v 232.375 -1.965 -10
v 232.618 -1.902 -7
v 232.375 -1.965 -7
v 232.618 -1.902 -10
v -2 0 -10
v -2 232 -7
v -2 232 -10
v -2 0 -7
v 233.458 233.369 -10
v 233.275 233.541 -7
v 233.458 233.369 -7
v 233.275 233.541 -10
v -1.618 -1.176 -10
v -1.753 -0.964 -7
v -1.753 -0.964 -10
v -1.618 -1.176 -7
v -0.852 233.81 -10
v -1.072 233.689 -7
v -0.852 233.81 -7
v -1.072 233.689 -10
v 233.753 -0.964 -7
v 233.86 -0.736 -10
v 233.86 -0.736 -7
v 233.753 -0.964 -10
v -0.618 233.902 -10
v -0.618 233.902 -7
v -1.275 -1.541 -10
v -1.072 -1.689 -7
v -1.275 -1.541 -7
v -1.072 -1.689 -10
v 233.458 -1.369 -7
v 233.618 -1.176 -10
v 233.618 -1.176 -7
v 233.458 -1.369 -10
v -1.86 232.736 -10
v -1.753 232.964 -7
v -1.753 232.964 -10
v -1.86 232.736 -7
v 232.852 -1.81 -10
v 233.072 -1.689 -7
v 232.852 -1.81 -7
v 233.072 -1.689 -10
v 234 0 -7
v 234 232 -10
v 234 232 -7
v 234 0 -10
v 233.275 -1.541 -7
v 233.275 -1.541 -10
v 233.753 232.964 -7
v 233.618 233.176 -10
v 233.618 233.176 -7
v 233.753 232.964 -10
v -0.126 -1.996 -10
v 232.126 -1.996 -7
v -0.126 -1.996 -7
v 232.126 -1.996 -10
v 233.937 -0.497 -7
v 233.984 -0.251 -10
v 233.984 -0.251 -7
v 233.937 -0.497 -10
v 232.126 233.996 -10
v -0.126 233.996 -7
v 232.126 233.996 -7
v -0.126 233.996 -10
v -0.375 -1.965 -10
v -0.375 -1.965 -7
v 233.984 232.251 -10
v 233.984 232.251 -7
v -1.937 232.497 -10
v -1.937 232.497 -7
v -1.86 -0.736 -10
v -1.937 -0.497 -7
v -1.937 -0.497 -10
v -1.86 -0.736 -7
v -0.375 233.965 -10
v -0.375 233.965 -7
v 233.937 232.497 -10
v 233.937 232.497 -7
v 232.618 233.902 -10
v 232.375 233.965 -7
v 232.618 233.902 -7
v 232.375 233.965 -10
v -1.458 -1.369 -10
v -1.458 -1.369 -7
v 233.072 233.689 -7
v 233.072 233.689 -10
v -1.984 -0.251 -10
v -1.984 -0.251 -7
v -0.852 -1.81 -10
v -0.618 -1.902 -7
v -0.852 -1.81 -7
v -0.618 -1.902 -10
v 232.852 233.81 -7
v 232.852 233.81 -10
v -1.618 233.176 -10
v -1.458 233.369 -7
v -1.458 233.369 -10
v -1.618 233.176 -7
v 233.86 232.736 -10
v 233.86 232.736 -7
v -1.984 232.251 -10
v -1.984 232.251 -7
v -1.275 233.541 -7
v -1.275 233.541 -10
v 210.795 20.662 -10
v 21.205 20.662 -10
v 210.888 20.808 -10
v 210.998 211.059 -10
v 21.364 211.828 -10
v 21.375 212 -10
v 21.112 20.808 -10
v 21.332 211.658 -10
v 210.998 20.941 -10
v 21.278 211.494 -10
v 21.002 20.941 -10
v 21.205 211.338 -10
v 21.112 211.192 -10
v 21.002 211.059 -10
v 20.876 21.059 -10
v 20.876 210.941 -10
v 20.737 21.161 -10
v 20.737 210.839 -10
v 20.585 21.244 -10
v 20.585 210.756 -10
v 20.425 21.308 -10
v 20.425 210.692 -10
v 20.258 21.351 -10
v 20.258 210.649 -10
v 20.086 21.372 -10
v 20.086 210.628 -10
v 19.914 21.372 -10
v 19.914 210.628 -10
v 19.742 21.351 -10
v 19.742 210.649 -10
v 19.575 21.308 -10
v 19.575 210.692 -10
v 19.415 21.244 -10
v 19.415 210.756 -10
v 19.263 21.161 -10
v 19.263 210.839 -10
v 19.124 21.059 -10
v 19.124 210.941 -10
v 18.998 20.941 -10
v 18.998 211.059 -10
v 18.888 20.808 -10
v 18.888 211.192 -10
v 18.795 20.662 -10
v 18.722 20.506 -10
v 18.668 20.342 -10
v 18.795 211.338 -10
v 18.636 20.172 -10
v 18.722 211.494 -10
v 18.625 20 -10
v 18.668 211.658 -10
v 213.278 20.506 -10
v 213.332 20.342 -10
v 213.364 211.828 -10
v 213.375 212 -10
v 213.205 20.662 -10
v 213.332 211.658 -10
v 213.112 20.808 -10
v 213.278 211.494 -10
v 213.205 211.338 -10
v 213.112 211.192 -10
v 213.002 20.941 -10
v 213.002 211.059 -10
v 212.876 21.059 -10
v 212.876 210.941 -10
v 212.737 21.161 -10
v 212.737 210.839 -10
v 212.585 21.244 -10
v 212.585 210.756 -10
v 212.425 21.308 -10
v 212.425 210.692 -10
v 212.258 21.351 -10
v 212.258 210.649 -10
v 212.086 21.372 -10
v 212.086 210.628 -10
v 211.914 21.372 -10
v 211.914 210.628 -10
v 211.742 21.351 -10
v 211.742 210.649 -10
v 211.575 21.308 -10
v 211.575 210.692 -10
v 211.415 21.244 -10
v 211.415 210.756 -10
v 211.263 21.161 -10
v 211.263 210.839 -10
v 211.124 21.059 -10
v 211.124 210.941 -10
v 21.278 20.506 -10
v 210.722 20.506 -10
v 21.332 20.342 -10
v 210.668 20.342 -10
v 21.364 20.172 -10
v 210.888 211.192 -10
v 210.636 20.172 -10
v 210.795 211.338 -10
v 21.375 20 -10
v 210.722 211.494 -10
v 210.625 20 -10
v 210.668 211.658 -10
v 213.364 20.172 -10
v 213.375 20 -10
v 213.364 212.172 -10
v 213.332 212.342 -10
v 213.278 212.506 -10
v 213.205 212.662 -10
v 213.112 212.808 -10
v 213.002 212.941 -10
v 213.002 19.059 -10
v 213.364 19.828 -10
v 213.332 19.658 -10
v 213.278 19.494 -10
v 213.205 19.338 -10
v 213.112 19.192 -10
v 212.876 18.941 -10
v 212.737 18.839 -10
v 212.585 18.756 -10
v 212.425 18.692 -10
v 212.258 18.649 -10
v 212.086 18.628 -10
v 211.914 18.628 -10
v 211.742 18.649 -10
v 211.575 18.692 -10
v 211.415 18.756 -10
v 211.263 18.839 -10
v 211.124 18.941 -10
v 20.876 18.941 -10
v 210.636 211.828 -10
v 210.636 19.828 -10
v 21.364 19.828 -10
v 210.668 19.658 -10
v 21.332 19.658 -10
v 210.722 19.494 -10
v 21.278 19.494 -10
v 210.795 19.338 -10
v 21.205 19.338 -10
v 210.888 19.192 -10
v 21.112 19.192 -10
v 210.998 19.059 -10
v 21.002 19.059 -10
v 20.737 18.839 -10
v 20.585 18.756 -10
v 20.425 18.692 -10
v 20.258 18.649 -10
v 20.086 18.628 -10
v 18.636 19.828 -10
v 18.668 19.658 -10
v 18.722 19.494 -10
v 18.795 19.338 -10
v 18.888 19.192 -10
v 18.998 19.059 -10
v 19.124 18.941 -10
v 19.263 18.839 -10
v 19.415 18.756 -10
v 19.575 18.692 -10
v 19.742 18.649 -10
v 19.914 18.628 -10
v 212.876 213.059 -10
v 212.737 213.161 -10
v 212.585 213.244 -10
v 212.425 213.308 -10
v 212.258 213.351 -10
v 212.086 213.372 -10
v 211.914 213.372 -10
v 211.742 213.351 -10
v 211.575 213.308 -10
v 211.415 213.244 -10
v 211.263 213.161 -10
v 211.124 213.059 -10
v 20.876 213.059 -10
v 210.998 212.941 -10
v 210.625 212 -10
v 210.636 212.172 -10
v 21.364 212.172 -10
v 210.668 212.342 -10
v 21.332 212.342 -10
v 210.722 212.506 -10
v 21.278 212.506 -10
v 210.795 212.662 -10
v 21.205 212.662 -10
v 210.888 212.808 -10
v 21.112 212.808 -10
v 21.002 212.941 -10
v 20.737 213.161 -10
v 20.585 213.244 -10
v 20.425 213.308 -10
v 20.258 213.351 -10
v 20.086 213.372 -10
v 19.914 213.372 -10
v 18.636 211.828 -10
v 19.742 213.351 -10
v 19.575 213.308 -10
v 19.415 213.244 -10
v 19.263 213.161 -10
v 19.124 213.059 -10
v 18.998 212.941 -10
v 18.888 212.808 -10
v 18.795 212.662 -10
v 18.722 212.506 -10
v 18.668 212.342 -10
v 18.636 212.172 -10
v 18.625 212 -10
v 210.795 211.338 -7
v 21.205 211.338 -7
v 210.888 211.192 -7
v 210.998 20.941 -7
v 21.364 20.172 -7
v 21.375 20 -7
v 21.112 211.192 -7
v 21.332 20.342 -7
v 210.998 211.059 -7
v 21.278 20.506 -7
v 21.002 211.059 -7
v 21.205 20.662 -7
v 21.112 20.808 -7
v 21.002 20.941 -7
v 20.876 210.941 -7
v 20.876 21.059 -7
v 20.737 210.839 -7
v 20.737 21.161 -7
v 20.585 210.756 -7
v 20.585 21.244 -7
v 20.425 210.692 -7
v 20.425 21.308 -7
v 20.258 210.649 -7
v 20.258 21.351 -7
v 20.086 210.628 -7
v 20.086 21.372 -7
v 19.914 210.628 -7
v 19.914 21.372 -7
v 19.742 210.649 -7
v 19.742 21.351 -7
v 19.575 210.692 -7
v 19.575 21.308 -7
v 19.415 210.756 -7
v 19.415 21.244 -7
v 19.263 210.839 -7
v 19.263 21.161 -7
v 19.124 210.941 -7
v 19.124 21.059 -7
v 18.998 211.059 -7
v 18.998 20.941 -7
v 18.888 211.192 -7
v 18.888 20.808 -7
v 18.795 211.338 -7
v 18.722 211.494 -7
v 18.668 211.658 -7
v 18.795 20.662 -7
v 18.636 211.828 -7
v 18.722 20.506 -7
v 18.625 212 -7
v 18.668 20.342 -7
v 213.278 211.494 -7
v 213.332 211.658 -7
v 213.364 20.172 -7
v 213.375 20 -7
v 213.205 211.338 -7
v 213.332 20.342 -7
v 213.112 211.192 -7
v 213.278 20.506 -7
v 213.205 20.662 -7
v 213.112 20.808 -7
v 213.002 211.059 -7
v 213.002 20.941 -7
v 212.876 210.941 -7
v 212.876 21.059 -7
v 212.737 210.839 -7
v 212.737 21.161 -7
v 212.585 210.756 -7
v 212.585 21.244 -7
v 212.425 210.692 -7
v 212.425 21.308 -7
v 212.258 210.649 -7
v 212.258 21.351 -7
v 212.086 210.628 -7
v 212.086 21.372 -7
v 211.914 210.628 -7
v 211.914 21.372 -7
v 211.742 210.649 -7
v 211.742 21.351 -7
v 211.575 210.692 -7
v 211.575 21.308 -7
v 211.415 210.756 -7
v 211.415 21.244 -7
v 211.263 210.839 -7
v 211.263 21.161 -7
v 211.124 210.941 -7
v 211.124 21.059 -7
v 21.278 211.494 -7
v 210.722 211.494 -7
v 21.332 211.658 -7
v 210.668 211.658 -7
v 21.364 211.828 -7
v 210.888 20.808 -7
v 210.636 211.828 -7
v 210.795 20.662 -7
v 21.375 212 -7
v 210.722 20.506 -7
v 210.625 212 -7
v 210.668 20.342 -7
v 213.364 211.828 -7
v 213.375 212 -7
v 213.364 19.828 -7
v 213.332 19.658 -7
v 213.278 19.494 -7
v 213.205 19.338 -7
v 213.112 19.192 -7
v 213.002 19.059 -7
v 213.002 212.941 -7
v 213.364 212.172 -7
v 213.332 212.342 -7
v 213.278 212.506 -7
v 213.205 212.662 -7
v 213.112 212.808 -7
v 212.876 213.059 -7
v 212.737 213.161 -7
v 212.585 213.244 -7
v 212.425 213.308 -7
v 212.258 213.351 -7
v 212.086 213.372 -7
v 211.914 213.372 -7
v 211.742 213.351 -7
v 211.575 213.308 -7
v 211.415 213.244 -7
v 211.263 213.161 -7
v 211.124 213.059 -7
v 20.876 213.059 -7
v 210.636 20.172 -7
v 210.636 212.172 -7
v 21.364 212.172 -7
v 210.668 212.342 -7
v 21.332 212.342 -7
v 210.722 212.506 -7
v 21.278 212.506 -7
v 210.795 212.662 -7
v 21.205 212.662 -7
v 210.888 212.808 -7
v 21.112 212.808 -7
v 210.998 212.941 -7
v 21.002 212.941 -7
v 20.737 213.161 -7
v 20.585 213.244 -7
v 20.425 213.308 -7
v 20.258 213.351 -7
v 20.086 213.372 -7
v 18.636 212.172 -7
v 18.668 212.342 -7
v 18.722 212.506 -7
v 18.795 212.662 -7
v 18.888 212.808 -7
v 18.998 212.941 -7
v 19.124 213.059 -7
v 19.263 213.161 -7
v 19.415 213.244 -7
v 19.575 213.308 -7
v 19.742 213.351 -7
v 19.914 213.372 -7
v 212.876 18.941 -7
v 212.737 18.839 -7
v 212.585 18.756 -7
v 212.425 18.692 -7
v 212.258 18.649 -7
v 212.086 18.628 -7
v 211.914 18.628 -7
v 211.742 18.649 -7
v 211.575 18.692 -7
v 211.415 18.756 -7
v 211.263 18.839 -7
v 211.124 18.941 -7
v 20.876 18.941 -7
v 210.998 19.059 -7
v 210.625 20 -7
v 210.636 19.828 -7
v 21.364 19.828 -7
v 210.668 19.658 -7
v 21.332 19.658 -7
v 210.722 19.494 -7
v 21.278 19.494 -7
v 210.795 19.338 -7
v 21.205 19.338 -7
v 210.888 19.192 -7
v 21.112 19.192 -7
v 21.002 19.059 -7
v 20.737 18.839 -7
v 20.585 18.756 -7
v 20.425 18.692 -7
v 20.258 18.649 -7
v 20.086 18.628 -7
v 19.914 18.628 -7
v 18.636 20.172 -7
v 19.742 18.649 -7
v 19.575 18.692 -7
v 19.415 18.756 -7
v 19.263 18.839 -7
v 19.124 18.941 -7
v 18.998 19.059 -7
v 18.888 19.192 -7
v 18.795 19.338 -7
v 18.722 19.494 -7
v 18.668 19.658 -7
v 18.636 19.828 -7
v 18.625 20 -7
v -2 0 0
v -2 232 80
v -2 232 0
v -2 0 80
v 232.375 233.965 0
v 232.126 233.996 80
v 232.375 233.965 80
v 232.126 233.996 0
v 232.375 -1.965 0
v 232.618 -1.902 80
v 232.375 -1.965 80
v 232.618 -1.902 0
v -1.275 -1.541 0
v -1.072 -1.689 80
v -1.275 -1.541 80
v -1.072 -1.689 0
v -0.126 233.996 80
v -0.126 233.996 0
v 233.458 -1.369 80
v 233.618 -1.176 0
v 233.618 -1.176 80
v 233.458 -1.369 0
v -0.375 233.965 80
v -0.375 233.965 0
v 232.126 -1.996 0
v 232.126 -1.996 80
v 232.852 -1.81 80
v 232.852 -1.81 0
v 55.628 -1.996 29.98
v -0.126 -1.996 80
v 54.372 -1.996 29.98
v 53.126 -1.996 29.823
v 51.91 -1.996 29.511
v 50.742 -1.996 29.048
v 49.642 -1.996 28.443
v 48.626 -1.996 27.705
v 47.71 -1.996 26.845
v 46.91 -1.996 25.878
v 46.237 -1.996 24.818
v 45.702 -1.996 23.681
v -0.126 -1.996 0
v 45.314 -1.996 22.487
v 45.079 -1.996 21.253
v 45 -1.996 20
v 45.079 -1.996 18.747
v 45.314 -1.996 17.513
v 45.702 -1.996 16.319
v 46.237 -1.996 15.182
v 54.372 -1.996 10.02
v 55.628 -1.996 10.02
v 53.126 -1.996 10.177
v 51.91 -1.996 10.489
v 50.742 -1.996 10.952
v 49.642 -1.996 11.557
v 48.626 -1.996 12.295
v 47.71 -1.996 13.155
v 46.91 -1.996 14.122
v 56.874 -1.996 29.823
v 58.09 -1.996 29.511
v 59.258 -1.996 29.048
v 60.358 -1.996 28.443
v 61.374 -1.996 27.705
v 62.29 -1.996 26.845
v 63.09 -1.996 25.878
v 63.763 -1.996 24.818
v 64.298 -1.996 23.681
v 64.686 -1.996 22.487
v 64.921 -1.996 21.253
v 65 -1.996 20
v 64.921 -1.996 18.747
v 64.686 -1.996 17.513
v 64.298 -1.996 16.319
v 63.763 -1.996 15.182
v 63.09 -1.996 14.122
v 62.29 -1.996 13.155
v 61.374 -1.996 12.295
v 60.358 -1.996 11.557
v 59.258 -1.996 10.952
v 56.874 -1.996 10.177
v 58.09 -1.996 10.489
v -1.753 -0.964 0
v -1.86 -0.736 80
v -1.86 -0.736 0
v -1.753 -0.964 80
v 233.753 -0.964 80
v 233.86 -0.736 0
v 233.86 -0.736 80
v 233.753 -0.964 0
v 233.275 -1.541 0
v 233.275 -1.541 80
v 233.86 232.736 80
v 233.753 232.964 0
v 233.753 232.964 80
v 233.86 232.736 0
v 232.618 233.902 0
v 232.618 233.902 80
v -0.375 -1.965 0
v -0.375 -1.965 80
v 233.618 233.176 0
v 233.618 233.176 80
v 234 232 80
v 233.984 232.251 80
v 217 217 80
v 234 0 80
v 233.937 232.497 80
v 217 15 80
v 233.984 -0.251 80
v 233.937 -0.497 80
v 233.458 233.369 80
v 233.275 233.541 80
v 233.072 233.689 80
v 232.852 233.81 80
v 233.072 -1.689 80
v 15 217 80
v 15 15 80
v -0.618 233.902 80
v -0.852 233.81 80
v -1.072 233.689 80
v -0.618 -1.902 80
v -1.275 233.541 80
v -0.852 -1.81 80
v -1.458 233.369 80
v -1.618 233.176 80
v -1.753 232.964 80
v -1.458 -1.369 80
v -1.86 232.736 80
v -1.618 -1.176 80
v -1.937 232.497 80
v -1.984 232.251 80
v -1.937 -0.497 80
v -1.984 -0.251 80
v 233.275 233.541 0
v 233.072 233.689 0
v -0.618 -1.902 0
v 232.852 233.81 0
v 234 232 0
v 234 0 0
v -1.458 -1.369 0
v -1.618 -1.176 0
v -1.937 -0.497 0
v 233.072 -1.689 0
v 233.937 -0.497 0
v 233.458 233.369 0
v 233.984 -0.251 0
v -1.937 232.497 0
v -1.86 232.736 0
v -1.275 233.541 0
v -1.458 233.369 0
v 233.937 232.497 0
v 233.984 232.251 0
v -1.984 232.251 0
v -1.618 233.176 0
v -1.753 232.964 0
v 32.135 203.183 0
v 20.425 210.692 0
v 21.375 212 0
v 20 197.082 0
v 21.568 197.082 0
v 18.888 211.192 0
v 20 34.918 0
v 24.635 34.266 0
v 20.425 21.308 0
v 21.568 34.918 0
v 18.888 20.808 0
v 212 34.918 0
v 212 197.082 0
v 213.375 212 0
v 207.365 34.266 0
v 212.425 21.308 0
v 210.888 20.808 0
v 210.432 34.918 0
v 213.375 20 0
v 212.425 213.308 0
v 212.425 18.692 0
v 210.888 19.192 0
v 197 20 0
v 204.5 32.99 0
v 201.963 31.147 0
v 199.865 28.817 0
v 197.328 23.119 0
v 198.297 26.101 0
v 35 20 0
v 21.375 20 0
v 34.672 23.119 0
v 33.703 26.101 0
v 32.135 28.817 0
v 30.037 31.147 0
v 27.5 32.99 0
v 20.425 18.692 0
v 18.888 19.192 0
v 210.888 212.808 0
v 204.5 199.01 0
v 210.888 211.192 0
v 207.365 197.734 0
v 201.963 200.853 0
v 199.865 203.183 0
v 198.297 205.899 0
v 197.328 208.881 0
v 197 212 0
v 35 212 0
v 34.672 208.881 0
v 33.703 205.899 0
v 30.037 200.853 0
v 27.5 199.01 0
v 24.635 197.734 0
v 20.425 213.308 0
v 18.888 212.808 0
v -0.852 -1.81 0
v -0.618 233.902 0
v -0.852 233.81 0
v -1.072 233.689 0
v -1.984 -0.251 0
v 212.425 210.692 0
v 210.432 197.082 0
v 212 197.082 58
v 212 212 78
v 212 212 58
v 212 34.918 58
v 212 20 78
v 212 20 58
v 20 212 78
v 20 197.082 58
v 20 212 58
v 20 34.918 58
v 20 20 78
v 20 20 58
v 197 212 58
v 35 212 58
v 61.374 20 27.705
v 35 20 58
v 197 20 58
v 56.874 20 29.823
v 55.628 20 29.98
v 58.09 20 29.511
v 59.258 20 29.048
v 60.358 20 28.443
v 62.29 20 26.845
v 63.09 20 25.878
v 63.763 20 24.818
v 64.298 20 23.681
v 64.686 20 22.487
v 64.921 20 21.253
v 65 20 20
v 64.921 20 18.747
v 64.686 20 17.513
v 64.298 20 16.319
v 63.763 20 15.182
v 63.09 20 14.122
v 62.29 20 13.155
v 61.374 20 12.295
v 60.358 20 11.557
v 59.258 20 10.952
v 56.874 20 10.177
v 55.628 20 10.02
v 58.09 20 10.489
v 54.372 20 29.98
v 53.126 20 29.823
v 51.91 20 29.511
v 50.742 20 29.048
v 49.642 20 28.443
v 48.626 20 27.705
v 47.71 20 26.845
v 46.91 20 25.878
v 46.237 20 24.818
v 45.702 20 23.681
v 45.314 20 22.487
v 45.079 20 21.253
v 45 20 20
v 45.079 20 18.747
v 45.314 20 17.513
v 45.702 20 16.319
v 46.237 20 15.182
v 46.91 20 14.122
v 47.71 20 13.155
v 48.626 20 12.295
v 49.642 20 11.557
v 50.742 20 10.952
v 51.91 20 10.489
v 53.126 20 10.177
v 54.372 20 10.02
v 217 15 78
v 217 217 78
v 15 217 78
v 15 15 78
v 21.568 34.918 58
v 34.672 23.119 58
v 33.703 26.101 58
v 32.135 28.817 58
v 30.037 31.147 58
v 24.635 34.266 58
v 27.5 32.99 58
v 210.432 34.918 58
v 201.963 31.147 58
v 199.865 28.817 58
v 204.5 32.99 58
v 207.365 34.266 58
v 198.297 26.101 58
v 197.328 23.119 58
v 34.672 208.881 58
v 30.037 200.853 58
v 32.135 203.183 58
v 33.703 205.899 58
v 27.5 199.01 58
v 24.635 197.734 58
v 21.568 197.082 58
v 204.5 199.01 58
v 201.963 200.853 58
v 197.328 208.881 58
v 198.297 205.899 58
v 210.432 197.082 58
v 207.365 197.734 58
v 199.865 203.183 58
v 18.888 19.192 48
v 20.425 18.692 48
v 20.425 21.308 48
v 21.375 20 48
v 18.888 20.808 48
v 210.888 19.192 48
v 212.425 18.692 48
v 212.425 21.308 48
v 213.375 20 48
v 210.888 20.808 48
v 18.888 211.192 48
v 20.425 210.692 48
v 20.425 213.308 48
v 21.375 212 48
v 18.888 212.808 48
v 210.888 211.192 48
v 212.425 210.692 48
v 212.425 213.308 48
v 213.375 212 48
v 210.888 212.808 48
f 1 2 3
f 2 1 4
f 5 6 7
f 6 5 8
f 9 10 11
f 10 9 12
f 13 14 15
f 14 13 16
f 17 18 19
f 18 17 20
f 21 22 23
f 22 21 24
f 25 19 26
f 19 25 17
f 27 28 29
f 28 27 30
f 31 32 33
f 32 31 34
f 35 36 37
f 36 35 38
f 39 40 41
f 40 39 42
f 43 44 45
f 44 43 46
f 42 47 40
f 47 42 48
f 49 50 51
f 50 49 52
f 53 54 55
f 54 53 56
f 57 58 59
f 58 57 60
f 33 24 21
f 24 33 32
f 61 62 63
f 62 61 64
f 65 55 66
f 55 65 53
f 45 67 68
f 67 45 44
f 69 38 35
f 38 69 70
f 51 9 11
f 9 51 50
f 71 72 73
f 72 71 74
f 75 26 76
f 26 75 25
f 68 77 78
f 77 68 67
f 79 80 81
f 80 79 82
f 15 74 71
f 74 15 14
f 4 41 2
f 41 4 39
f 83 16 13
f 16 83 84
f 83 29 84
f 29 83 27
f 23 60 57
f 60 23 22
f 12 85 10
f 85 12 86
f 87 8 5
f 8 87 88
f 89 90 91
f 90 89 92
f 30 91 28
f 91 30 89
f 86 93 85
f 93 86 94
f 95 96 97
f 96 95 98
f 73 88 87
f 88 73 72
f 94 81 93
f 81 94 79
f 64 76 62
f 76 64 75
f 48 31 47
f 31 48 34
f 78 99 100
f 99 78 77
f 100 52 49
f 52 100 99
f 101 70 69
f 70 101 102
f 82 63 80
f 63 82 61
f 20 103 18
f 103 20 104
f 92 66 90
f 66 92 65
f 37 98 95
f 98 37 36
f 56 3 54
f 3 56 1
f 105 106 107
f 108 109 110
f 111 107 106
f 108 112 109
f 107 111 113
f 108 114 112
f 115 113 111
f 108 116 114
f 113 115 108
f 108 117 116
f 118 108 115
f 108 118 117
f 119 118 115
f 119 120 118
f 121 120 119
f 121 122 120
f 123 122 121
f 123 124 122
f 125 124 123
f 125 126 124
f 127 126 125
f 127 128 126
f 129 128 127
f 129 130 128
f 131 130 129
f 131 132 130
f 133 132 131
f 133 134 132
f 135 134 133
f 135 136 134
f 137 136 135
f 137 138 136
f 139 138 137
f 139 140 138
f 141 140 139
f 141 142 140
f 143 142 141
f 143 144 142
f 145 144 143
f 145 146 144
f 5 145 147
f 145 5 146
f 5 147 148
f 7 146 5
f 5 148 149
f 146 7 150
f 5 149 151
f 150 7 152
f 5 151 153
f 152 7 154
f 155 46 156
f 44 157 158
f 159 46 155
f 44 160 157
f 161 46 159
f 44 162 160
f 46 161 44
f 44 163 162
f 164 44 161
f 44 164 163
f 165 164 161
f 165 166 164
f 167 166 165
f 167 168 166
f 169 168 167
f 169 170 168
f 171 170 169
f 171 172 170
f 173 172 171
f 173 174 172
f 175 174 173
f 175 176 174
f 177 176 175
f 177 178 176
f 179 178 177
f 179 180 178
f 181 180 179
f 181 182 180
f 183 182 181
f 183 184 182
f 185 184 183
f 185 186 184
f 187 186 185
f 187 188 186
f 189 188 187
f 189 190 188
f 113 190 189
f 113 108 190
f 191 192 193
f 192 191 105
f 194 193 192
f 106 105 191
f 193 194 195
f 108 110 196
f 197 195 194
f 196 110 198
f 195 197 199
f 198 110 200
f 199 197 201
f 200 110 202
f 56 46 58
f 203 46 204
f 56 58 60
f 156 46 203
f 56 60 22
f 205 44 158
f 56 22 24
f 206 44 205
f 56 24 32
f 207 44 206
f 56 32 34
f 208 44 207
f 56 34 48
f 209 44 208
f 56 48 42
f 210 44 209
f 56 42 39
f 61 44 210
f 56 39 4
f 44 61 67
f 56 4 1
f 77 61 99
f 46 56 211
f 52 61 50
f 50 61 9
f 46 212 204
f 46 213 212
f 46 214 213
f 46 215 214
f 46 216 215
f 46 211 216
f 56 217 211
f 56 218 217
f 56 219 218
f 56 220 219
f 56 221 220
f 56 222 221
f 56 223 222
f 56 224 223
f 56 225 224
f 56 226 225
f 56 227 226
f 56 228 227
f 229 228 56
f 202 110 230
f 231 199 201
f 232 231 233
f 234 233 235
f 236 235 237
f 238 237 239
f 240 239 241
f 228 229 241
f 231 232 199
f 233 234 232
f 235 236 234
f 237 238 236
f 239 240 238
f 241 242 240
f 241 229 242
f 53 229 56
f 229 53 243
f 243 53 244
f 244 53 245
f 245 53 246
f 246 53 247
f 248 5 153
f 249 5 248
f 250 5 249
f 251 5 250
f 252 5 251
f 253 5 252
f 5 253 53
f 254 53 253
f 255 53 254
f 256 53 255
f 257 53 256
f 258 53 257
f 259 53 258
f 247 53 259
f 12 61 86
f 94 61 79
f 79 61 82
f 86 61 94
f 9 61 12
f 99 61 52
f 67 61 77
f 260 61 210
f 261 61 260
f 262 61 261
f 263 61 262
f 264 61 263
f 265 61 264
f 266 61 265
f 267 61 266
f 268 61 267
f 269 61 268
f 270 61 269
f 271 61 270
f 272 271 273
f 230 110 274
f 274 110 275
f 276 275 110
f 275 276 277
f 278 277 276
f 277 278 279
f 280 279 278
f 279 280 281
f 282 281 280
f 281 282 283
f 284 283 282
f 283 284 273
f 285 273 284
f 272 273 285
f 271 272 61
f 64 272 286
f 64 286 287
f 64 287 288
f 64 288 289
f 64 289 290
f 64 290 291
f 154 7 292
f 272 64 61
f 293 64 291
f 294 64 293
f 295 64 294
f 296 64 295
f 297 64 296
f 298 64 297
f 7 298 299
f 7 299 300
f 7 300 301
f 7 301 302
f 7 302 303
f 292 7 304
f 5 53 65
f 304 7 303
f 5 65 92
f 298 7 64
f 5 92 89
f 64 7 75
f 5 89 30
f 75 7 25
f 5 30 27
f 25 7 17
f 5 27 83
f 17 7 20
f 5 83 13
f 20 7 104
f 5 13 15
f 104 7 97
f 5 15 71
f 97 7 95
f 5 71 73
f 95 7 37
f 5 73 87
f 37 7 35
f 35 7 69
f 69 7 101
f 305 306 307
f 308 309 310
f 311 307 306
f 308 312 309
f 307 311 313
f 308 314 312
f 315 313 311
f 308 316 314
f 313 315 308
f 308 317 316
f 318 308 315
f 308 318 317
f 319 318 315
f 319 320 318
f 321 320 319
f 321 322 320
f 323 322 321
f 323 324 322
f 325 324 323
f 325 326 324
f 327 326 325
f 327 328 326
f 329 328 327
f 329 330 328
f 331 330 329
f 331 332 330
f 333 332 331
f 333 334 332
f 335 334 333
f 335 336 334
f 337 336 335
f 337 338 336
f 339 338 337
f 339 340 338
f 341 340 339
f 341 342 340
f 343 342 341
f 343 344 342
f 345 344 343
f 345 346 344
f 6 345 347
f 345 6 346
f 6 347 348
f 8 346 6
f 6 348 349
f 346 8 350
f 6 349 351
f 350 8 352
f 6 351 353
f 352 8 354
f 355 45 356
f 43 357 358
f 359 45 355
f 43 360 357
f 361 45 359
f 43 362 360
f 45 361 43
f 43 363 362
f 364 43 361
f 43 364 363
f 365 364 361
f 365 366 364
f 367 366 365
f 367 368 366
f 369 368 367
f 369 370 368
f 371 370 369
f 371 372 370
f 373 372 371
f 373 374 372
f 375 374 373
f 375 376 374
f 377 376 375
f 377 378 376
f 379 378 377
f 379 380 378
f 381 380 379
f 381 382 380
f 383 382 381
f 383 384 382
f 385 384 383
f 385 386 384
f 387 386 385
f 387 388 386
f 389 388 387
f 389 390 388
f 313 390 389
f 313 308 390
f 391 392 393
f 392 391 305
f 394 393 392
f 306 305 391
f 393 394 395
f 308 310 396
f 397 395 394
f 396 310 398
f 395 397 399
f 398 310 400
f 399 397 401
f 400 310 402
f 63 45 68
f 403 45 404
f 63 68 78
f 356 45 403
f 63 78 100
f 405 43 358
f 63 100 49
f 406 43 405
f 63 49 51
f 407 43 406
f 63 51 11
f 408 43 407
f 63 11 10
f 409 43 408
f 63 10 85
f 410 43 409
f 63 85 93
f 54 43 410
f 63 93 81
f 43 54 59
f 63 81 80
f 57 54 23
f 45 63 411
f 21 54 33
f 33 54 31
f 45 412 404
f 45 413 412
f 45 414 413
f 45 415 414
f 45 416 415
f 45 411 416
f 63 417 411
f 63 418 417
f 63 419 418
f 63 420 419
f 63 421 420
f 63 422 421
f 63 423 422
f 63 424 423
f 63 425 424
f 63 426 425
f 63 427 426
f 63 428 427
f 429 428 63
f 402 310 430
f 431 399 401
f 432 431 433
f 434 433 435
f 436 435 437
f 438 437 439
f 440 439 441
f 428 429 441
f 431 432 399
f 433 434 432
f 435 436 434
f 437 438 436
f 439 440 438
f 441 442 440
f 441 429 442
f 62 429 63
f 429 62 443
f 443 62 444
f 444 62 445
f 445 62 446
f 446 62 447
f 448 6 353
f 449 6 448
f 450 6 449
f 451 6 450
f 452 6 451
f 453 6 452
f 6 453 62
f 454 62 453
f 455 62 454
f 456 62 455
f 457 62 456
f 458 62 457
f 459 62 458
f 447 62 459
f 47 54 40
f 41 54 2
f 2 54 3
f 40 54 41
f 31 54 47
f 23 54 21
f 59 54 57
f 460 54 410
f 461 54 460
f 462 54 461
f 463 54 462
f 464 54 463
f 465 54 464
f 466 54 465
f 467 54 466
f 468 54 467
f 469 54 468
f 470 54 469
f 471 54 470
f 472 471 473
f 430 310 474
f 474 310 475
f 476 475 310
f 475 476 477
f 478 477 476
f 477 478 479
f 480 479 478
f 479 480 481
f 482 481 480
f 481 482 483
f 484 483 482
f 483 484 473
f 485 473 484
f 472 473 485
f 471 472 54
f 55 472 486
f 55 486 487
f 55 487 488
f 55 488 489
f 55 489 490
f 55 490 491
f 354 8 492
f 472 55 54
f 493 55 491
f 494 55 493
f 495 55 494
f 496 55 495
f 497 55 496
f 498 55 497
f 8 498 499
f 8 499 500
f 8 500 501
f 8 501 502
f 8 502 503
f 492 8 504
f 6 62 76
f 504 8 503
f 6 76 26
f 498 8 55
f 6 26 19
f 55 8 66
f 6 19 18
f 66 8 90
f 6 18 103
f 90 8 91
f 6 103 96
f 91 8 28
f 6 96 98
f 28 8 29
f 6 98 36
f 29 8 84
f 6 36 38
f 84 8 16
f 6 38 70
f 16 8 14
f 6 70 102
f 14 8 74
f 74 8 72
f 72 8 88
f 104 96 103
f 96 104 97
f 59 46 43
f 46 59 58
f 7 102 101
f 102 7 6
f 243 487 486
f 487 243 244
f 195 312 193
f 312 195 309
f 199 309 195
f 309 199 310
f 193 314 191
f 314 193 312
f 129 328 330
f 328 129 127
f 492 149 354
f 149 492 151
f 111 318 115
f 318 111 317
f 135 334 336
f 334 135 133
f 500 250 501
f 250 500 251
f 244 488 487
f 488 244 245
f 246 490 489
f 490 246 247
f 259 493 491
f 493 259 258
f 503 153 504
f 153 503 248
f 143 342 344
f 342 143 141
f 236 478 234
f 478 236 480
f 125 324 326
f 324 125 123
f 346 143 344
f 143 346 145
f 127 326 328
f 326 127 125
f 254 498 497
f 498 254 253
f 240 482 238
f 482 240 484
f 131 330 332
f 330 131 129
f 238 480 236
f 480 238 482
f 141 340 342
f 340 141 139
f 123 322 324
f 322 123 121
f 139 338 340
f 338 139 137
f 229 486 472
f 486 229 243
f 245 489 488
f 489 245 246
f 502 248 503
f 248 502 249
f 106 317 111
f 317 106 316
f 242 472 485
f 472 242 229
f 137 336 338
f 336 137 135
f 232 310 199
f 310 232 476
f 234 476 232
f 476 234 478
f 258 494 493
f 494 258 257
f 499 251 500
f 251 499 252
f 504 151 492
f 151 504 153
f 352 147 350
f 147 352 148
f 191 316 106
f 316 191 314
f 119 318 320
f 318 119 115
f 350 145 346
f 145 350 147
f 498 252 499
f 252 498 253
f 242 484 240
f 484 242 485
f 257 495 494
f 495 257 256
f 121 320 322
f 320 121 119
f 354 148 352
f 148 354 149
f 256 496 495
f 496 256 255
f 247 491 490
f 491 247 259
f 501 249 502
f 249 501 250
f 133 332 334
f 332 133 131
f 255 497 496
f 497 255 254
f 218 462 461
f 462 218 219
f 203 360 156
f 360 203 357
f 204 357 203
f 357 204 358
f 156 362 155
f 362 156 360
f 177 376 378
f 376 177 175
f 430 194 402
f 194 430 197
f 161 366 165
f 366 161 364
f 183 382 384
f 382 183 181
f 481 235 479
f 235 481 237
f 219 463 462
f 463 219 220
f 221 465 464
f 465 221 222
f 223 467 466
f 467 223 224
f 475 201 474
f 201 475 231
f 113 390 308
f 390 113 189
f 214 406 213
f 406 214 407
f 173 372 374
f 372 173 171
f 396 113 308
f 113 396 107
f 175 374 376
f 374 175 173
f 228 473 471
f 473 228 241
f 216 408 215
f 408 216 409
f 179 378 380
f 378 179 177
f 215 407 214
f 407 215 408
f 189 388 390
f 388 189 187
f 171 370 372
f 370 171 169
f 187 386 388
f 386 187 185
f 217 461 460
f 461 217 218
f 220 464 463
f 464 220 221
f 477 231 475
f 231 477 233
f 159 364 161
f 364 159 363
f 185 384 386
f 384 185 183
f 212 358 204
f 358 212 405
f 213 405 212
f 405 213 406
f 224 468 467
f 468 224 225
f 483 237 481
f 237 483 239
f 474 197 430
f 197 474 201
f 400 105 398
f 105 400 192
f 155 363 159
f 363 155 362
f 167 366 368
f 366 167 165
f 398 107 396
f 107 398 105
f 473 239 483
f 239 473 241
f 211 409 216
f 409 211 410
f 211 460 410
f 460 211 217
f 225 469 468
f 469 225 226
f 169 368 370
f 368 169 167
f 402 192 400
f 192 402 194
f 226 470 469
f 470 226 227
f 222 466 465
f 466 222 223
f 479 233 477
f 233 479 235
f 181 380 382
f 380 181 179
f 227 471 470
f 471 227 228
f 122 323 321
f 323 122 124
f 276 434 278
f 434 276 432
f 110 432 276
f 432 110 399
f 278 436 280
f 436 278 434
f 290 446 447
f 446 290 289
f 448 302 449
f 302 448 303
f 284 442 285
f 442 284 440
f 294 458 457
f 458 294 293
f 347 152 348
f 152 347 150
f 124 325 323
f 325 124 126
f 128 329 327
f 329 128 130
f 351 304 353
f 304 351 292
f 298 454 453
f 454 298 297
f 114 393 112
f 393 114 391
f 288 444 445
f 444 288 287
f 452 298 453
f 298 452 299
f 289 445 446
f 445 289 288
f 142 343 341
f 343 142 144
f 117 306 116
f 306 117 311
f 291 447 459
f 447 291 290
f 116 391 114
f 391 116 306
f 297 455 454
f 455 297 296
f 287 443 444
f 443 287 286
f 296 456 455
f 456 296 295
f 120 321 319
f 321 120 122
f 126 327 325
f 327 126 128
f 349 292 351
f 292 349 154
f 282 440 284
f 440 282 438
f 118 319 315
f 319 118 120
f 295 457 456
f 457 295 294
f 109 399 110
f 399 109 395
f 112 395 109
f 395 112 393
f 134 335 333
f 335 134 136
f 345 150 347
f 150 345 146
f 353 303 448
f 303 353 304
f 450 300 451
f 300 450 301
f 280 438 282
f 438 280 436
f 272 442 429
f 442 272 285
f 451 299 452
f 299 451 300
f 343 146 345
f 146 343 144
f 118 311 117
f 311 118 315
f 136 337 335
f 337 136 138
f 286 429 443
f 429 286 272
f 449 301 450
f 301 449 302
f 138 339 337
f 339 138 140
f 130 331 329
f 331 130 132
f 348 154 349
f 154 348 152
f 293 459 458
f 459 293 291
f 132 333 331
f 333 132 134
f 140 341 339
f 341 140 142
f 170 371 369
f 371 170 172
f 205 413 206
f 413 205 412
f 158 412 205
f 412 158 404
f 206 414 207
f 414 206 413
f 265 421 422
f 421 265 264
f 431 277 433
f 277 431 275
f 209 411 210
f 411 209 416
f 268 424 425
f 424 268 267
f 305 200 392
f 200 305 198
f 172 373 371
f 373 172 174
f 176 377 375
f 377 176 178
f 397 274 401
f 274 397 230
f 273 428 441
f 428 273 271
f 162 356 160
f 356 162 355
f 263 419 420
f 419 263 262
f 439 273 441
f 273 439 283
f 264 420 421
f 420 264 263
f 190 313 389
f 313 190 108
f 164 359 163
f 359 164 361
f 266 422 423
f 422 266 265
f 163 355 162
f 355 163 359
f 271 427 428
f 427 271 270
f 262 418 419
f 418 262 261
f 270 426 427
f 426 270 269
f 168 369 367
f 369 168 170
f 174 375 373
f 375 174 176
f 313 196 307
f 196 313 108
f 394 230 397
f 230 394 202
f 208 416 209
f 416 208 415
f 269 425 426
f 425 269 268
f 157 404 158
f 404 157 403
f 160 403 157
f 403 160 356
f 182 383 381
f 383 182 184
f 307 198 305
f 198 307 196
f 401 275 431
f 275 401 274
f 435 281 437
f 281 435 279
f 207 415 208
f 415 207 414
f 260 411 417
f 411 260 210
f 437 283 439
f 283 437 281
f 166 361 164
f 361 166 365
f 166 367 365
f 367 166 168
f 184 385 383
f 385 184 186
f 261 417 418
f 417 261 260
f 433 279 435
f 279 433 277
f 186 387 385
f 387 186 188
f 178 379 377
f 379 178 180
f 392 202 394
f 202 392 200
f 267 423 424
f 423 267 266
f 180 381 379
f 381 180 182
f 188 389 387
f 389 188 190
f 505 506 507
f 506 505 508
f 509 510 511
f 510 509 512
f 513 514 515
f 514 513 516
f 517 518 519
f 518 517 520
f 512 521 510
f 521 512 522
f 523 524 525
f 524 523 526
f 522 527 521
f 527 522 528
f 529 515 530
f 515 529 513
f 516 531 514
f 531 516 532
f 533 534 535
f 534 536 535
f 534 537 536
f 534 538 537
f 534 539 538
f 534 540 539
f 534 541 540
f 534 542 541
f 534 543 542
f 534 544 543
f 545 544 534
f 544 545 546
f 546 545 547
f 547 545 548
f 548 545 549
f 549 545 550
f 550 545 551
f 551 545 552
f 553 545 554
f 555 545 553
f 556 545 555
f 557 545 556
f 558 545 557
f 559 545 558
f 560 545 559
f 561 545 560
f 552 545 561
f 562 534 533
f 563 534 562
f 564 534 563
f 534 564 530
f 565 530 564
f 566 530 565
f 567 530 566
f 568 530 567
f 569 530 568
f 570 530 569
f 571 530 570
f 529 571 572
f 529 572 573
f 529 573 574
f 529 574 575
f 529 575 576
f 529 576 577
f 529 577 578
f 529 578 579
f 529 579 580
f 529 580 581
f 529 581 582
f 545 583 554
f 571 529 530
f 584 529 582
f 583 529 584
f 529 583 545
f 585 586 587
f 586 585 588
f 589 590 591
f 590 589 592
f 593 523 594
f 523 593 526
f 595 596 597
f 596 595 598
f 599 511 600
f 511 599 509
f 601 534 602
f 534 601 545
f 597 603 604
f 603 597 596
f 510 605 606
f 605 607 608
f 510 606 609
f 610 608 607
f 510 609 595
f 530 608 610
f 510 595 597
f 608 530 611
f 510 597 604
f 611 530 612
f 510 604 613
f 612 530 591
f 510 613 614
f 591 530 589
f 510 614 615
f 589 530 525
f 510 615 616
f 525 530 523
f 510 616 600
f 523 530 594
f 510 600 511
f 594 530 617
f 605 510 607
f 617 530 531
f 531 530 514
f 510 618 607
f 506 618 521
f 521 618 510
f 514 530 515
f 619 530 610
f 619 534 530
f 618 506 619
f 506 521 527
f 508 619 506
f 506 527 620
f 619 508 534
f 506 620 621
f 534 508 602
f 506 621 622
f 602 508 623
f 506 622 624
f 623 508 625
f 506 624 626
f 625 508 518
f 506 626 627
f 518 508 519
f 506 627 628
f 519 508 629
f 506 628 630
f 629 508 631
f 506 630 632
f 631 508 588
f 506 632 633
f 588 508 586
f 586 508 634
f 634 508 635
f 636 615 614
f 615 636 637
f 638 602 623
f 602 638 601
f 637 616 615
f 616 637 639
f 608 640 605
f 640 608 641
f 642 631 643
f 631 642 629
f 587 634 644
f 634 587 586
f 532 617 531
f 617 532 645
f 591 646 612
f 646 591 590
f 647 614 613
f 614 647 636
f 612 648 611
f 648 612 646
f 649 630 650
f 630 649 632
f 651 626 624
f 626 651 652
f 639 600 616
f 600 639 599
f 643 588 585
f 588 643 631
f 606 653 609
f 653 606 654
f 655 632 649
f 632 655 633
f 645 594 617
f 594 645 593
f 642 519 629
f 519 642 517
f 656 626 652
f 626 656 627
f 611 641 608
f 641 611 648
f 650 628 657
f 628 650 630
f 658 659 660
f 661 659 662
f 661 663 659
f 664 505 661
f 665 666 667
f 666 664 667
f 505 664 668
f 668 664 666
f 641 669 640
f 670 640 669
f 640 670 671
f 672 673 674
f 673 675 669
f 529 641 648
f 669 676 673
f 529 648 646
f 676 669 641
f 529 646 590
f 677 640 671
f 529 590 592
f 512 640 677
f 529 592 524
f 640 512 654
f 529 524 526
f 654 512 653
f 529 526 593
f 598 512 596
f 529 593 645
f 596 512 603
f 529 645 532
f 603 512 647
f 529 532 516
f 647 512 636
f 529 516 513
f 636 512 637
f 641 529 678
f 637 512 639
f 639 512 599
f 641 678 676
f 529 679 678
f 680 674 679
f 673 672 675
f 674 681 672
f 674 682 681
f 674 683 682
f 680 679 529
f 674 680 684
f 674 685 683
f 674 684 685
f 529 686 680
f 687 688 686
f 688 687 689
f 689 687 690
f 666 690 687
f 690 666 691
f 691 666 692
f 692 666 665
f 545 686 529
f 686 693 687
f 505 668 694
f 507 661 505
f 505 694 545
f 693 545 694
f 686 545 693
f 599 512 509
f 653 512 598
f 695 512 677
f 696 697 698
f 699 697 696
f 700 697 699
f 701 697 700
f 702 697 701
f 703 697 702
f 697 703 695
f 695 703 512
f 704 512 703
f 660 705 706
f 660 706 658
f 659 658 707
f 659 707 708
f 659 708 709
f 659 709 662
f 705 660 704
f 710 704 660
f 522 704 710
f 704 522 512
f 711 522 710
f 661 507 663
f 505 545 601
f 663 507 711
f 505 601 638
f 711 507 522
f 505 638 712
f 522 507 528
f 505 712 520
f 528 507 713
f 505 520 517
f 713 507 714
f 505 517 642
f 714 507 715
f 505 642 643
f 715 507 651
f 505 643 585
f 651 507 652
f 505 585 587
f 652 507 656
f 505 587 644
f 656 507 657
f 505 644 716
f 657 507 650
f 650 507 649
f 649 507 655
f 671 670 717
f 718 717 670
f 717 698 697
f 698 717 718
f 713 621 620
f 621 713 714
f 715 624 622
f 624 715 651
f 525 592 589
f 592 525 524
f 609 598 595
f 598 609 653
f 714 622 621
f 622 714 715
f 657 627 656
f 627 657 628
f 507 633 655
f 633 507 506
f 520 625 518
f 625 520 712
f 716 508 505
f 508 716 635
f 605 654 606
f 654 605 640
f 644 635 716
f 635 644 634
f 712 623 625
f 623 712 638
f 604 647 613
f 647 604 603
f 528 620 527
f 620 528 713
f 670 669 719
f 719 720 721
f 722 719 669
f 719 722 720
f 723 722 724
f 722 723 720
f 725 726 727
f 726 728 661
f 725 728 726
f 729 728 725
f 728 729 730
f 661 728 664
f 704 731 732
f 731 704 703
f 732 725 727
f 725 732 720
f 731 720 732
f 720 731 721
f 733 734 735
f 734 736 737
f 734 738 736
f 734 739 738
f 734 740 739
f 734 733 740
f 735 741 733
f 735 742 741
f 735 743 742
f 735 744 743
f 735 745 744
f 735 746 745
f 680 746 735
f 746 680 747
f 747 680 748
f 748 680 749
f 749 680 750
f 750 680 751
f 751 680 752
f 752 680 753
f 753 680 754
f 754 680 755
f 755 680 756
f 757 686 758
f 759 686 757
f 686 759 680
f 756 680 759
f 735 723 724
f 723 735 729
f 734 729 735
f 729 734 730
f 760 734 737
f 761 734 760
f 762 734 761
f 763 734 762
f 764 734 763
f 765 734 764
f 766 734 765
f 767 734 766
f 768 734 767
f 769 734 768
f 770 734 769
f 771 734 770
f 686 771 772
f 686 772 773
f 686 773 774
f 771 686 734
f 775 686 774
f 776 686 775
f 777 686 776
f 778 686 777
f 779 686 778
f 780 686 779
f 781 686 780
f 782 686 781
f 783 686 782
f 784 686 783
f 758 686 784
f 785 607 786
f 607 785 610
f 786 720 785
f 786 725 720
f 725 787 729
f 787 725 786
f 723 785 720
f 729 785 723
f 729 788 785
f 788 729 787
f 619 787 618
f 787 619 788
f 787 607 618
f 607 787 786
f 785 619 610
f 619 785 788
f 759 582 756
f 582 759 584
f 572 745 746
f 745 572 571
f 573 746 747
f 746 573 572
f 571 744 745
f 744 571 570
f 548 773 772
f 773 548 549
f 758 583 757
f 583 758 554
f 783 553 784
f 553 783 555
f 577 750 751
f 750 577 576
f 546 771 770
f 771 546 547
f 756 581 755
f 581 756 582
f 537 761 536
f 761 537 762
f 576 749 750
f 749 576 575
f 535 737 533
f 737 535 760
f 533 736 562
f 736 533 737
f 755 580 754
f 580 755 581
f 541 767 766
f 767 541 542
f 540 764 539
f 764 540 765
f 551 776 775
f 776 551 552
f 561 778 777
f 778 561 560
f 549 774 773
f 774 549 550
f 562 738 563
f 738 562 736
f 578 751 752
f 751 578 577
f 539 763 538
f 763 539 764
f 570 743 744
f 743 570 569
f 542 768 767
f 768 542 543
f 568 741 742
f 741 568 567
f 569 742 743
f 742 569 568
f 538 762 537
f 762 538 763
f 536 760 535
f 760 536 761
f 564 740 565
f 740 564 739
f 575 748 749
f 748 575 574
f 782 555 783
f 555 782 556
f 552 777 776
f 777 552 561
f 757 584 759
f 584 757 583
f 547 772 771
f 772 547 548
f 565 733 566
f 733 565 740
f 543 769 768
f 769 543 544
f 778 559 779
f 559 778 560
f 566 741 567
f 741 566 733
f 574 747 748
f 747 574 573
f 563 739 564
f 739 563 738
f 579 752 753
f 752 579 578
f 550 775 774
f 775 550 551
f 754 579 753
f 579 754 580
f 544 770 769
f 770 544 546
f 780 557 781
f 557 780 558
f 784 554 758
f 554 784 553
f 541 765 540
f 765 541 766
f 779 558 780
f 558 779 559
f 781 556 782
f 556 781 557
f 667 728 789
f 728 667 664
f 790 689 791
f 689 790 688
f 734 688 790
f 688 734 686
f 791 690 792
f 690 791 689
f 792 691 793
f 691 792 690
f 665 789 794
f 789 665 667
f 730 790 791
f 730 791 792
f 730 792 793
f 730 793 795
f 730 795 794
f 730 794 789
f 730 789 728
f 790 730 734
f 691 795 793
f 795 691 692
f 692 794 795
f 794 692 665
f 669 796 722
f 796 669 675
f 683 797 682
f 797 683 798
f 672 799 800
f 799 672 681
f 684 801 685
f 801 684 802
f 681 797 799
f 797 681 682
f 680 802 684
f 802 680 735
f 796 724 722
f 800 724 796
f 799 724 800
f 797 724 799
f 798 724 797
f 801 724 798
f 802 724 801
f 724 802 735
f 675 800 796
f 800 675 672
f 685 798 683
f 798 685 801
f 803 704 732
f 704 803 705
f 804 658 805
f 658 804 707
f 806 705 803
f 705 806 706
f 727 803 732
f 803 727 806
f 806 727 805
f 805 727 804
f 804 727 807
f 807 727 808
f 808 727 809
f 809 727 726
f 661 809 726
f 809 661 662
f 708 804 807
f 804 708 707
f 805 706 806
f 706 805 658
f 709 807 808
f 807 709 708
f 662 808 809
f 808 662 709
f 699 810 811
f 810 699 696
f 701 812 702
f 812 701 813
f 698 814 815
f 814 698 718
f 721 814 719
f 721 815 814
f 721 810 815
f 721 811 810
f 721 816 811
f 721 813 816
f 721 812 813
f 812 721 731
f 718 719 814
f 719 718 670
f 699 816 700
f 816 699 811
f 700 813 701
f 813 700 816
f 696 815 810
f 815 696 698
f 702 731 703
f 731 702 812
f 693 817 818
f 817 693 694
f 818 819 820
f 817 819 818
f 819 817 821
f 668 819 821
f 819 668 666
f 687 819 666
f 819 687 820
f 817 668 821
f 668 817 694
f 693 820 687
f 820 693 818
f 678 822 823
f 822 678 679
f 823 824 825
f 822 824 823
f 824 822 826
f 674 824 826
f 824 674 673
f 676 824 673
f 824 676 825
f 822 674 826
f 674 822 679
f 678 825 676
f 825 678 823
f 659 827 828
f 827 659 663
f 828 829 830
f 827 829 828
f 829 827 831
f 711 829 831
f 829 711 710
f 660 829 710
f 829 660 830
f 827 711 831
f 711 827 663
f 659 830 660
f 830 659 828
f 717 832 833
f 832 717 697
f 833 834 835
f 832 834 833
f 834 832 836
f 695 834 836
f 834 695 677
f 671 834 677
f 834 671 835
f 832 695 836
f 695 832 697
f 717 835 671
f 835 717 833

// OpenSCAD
ledmatrix_len = 192; //led matrix length
bevel_len = 20; //matrix to edge length
box_depth = 80; //the depth of the whole thing
recess_len = 20; //how far the matrix should be recessed

glass_overreach = 5;
glass_thickness = 2;

matrix_holder_rad = 15;

charger_rad = 10;
charger_clearance = 10;

screw_rad = 2.75/2; //M3 screw

lid_thickness = 3;

difference(){
    $fn = 50;
    translate([0, 0, -10]){
        minkowski(){
            cylinder(h=lid_thickness/2, r=2);
            cube([ledmatrix_len+2*bevel_len, ledmatrix_len+2*bevel_len, lid_thickness/2]);
        }
    }
    translate([bevel_len, bevel_len, -20]){
        cylinder(h=box_depth-recess_len-glass_thickness, r=screw_rad);
    }
    translate([bevel_len+ledmatrix_len, bevel_len, -20]){
        cylinder(h=box_depth-recess_len-glass_thickness, r=screw_rad);
    }
    translate([bevel_len, bevel_len+ledmatrix_len, -20]){
        cylinder(h=box_depth-recess_len-glass_thickness, r=screw_rad);
    }
    translate([bevel_len+ledmatrix_len, bevel_len+ledmatrix_len, -20]){
        cylinder(h=box_depth-recess_len-glass_thickness, r=screw_rad);
    }
}

difference(){
    union(){
        difference(){
            $fn = 50;
            minkowski(){
                cylinder(h=box_depth/2, r=2);
                cube([ledmatrix_len+2*bevel_len, ledmatrix_len+2*bevel_len, box_depth/2]);
            }
            translate([bevel_len, bevel_len, -box_depth/2]){
                cube([ledmatrix_len, ledmatrix_len, 2*box_depth]);
            }
            translate([bevel_len-glass_overreach, bevel_len-glass_overreach, box_depth-glass_thickness]){
                cube([ledmatrix_len+2*glass_overreach, ledmatrix_len+2*glass_overreach, box_depth]);
            }
            translate([bevel_len+charger_rad+matrix_holder_rad+charger_clearance,1.5*bevel_len,charger_rad+charger_clearance]){
                rotate([90,0,0]){
                    cylinder(h=2*bevel_len, r=charger_rad);
                }
            }
        }

        translate([bevel_len, bevel_len, 0]){
            cylinder(h=box_depth-recess_len-glass_thickness, r=matrix_holder_rad);
        }
        
        translate([bevel_len+ledmatrix_len, bevel_len, 0]){
            cylinder(h=box_depth-recess_len-glass_thickness, r=matrix_holder_rad);
        }
        
        translate([bevel_len, bevel_len+ledmatrix_len, 0]){
            cylinder(h=box_depth-recess_len-glass_thickness, r=matrix_holder_rad);
        }
        
        translate([bevel_len+ledmatrix_len, bevel_len+ledmatrix_len, 0]){
            cylinder(h=box_depth-recess_len-glass_thickness, r=matrix_holder_rad);
        }
    }
    translate([bevel_len, bevel_len, -10]){
        cylinder(h=box_depth-recess_len-glass_thickness, r=screw_rad);
    }
    translate([bevel_len+ledmatrix_len, bevel_len, -10]){
        cylinder(h=box_depth-recess_len-glass_thickness, r=screw_rad);
    }
    translate([bevel_len, bevel_len+ledmatrix_len, -10]){
        cylinder(h=box_depth-recess_len-glass_thickness, r=screw_rad);
    }
    translate([bevel_len+ledmatrix_len, bevel_len+ledmatrix_len, -10]){
        cylinder(h=box_depth-recess_len-glass_thickness, r=screw_rad);
    }
}
